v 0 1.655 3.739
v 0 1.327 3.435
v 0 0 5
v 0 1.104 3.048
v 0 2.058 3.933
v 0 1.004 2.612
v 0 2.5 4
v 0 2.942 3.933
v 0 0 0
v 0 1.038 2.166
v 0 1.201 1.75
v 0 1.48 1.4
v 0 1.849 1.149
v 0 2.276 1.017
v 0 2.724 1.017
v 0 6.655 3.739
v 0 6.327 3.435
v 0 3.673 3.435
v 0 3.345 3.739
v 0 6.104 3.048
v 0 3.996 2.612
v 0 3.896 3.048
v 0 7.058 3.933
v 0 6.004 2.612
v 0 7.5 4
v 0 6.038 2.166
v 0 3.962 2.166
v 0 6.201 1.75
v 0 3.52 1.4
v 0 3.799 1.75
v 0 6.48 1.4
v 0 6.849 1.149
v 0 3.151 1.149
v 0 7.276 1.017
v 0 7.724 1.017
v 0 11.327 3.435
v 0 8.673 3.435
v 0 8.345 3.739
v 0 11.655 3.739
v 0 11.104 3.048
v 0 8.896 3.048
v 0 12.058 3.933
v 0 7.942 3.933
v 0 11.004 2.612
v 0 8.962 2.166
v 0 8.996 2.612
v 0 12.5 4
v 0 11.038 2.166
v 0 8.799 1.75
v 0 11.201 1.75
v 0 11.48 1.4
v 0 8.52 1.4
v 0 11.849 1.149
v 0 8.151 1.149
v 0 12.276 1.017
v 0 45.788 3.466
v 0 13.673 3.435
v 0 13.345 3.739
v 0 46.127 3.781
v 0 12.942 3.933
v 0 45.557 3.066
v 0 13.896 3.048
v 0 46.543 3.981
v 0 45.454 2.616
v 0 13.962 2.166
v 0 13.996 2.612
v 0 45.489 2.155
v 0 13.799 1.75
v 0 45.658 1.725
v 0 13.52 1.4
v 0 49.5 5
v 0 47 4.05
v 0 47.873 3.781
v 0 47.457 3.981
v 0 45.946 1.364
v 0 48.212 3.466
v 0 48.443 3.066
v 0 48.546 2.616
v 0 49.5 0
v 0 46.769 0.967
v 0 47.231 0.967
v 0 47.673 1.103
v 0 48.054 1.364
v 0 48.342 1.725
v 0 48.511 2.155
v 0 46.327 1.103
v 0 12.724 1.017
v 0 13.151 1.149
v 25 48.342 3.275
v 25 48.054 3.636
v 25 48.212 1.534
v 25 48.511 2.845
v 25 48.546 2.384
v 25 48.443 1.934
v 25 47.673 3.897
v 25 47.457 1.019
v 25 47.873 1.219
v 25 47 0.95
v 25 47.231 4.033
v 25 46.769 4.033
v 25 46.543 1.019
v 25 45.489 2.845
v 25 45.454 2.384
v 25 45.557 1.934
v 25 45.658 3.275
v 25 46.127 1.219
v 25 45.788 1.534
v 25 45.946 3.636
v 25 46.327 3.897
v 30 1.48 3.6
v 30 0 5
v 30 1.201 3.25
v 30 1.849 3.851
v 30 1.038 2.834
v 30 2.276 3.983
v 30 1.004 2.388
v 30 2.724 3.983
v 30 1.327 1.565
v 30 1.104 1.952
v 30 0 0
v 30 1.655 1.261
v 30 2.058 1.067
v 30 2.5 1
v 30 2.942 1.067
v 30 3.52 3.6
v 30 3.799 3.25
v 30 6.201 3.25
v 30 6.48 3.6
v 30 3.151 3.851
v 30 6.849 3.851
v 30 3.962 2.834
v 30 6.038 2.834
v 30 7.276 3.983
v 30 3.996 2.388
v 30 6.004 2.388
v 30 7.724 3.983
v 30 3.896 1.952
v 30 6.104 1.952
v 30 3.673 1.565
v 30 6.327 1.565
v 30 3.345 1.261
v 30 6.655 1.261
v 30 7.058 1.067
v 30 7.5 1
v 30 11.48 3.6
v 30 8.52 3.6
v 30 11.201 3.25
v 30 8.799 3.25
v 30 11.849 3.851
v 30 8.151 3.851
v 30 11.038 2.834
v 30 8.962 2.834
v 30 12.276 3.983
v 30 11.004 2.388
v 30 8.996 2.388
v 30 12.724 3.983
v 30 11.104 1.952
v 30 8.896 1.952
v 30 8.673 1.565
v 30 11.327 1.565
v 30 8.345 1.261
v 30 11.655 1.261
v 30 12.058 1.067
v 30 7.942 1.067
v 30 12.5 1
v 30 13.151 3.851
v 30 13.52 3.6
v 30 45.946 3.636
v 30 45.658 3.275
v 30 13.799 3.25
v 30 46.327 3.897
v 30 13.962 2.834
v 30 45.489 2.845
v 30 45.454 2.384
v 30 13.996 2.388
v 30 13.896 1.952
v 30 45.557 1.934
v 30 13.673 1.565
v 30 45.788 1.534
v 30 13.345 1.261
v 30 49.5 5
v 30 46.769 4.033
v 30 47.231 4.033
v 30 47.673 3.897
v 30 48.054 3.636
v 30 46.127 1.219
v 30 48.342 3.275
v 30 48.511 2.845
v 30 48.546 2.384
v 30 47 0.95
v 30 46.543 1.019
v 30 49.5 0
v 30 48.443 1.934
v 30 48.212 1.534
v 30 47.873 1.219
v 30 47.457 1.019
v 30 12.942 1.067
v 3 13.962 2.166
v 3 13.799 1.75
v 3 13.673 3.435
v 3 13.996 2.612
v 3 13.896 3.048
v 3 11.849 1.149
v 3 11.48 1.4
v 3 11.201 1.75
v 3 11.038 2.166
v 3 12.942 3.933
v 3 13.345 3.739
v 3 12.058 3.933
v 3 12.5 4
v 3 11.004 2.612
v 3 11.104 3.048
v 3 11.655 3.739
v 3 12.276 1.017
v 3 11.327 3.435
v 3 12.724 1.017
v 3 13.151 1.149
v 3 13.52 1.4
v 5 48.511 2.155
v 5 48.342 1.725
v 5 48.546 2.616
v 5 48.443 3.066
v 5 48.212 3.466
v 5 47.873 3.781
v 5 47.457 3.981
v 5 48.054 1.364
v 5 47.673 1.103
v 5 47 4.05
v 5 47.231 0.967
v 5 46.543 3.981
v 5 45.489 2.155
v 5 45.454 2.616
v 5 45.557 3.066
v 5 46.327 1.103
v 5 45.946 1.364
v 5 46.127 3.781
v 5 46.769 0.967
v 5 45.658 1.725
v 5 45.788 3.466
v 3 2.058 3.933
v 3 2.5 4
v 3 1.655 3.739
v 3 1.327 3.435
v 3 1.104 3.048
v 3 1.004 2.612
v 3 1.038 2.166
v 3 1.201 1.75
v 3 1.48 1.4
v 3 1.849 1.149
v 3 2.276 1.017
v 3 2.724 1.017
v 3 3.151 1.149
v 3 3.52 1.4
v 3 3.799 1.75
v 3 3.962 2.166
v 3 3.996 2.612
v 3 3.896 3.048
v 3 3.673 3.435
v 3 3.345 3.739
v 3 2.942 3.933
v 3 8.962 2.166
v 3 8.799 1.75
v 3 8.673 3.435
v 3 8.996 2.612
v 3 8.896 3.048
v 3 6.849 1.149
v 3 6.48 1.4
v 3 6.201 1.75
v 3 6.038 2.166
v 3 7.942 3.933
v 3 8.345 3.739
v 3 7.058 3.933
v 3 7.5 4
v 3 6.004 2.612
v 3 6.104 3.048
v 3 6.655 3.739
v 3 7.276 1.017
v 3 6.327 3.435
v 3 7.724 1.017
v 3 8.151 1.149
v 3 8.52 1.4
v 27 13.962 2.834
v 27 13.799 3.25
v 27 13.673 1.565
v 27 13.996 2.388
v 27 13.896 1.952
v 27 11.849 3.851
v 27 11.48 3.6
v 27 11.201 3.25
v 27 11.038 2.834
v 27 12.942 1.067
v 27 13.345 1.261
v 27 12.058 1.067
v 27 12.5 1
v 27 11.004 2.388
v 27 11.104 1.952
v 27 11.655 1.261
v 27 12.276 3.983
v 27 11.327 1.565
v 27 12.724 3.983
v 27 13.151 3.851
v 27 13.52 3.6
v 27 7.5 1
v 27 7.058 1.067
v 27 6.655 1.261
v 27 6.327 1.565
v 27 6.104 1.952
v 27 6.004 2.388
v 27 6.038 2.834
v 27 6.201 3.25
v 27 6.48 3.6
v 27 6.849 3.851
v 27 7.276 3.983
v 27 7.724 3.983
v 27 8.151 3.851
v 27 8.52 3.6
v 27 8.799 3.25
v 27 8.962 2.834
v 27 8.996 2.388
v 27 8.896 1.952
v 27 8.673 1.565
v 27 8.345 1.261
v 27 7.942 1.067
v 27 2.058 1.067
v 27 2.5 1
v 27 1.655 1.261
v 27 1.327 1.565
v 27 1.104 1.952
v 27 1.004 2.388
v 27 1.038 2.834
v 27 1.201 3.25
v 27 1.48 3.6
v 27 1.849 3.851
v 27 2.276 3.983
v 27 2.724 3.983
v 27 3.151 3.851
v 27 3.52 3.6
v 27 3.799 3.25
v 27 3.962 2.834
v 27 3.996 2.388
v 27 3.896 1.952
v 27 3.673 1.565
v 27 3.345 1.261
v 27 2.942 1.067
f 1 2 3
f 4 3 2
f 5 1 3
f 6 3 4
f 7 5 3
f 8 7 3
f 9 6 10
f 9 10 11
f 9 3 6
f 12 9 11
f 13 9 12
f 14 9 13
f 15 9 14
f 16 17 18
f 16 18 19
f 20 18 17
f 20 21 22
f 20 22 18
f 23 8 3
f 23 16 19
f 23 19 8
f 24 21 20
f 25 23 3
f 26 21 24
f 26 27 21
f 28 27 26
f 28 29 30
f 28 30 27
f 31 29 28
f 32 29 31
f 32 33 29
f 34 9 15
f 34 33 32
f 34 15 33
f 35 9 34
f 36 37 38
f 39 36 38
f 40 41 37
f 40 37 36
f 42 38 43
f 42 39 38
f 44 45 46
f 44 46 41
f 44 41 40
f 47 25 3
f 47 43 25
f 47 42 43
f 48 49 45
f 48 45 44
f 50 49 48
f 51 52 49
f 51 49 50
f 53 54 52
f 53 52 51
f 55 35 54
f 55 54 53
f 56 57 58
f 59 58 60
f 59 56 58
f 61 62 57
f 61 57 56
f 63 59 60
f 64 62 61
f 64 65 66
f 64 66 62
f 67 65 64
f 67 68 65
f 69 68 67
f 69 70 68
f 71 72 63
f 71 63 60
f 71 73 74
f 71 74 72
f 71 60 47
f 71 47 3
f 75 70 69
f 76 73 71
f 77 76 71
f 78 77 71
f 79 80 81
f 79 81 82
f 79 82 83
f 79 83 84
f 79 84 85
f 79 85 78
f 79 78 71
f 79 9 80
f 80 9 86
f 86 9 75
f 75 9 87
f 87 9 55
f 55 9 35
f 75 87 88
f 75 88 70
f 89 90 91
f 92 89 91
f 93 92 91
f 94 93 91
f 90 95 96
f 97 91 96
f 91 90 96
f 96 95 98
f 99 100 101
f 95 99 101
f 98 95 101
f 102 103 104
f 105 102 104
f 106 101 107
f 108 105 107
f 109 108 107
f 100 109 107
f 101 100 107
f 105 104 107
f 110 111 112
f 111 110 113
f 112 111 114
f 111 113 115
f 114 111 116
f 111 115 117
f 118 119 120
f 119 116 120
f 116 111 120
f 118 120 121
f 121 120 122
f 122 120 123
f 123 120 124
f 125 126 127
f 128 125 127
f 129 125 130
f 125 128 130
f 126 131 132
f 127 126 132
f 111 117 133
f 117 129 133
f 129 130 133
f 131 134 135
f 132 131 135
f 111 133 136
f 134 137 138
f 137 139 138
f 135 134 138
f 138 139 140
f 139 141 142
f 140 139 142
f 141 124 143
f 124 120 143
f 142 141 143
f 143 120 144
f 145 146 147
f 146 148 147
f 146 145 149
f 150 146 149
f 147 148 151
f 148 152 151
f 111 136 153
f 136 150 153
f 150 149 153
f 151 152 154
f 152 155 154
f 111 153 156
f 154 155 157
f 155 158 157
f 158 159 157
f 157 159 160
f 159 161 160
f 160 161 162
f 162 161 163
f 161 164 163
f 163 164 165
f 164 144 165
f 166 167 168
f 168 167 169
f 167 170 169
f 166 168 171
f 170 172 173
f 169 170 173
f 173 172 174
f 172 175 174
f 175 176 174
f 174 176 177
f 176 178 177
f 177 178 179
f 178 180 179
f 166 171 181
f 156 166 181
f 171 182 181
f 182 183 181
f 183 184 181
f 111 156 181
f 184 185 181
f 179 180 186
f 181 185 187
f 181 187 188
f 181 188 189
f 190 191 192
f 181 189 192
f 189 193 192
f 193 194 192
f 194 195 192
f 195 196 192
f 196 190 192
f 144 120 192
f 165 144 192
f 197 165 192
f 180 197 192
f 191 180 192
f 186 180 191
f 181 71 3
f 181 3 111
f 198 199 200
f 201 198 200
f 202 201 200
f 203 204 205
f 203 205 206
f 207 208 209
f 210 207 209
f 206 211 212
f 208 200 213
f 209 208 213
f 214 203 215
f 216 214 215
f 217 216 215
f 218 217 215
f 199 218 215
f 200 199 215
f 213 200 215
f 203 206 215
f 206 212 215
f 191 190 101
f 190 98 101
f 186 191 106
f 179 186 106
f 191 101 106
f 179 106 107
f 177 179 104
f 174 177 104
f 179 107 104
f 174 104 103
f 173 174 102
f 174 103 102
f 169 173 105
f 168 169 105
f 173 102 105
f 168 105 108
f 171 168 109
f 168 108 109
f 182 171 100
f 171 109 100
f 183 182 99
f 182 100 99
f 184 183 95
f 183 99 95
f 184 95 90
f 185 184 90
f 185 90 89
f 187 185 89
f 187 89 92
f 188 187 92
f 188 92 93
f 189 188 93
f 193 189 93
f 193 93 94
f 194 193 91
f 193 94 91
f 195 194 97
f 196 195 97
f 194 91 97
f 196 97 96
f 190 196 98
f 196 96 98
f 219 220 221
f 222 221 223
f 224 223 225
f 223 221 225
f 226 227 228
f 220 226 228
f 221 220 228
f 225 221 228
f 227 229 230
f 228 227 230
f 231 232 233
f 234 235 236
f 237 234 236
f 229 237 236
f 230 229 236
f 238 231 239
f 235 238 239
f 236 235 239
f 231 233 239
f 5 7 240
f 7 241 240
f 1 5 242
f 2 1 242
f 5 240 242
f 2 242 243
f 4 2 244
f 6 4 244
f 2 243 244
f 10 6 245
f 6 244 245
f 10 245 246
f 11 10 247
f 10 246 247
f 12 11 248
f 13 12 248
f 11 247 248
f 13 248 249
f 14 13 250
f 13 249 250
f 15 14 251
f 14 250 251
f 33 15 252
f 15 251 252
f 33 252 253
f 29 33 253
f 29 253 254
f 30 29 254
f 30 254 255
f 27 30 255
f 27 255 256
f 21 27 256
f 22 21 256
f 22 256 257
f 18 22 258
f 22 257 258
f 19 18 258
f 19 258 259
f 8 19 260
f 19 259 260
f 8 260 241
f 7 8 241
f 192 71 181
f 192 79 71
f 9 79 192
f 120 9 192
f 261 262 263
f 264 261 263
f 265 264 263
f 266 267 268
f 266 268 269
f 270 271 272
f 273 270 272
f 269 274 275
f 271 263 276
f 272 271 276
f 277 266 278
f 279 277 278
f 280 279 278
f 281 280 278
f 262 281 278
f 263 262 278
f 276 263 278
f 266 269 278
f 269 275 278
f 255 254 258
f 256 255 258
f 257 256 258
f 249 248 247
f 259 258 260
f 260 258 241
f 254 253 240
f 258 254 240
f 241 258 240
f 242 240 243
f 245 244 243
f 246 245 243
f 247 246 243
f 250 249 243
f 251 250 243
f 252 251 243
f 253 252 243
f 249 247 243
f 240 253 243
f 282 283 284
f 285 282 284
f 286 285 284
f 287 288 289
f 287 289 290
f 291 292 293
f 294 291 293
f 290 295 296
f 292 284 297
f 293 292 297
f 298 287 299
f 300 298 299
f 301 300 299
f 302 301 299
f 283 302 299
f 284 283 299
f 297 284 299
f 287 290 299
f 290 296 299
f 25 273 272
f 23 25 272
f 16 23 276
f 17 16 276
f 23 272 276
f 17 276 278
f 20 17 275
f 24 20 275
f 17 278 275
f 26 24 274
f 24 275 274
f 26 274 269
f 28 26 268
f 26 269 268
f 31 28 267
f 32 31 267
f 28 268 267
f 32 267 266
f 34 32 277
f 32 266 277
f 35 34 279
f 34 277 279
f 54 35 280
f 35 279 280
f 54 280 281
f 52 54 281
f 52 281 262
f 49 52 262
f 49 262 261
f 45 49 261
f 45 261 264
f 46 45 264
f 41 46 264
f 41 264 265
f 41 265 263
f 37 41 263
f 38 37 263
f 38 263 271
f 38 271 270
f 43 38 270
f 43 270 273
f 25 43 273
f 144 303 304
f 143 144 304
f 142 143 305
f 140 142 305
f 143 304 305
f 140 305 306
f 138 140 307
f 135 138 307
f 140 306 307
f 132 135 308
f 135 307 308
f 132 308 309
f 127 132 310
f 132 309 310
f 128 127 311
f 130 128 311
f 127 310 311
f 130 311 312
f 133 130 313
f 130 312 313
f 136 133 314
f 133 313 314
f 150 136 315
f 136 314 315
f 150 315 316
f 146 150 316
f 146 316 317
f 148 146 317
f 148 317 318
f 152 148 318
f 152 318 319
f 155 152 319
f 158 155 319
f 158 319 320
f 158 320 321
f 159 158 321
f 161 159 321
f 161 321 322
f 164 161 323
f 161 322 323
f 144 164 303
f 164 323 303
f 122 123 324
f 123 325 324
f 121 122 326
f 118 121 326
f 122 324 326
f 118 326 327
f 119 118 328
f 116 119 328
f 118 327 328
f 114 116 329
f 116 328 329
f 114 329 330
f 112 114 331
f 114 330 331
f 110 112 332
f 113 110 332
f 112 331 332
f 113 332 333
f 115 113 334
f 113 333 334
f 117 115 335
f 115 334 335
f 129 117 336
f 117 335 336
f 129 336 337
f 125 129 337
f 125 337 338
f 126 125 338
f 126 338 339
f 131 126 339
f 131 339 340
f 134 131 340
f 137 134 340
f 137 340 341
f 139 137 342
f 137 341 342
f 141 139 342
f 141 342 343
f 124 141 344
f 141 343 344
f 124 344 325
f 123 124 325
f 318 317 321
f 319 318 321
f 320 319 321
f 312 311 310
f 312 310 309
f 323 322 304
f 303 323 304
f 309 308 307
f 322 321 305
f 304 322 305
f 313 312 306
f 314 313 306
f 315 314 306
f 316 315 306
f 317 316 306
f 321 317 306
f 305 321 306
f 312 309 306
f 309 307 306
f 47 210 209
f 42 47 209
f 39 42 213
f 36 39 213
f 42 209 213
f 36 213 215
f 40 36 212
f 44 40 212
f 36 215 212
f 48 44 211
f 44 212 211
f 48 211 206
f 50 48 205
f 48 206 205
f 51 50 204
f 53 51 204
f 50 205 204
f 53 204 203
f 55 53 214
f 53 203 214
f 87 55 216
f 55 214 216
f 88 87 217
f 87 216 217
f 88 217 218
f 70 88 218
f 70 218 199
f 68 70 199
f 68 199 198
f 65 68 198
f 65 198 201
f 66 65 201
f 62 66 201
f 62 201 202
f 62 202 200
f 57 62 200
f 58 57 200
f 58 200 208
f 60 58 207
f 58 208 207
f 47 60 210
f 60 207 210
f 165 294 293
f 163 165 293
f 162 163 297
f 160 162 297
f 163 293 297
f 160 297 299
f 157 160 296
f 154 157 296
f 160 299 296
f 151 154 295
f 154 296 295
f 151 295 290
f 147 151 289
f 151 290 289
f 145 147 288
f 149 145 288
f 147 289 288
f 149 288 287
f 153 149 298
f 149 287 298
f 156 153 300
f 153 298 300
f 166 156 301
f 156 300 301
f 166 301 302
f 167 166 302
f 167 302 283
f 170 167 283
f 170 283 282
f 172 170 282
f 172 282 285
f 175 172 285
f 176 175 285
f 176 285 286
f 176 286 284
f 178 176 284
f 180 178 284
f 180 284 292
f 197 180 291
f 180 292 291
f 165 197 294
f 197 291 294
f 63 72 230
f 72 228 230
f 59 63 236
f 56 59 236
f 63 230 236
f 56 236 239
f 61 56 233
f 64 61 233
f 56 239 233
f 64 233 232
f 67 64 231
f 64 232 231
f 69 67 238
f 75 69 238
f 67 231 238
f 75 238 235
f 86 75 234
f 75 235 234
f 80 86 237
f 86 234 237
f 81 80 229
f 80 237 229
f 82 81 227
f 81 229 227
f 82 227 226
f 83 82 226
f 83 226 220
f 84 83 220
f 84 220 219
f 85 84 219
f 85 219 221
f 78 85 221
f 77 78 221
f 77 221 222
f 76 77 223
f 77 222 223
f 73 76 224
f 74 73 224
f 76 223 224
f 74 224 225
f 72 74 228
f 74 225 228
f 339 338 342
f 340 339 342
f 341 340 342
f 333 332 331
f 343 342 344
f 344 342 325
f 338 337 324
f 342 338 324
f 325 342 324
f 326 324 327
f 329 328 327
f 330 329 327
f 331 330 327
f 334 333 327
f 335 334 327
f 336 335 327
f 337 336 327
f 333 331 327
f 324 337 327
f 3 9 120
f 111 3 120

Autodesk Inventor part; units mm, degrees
ref_plane "YZ Plane" through (0, 0, 0) normal (1, 0, 0) x (0, 1, 0)
ref_plane "XZ Plane" through (0, 0, 0) normal (0, 1, 0) x (-1, 0, 0)
ref_plane "XY Plane" through (0, 0, 0) normal (0, 0, 1) x (1, 0, 0)
sketch "スケッチ1" plane through (0, 0, 0) normal (0, 0, 1) x (1, 0, 0)
  line L0 (0, 49.5) -> (30, 49.5)
  line L1 (0, 0) -> (30, 0)
  line L2 (0, 0) -> (0, 49.5)
  line L3 (30, 0) -> (30, 49.5)
  dimension "d2" = 30
  dimension "d38" = 49.5
extrude "押し出し1" add sketch "スケッチ1" along normal blind 5
sketch "スケッチ4" plane through (30, 0, 0) normal (1, 0, 0) x (0, 0, -1)
  line L0 (0, 49.5) -> (-5, 49.5) projected
  line L1 (-2.5, 49.5) -> (-2.5, 0) construction
  line L2 (0, 0) -> (-5, 0) projected
  point P0 (0, 0)
  point P1 (-2.5, 47)
  point P2 (-2.5, 2.5)
  point P3 (-2.5, 7.5)
  point P4 (-2.5, 12.5)
  dimension "d22" = 2.5
  dimension "d40" = 2.5
  dimension "d41" = 5
  dimension "d42" = 5
hole "穴1" at (30, 47, 2.5) direction (-1, 0, 0) diameter 3.1 depth 5
sketch "スケッチ5" plane through (0, 0, 0) normal (-1, 0, 0) x (0, 0, 1)
  circle A0 centre (2.5, 47) radius 1.55 projected
  line L0 (0, 0) -> (5, 0) projected
  line L1 (2.5, 0) -> (2.5, 49.5) construction
  line L2 (0, 49.5) -> (5, 49.5) projected
  point P0 (2.5, 2.5)
  point P1 (2.5, 7.5)
  point P2 (2.5, 12.5)
  dimension "d50" = 2.5
  dimension "d51" = 5
  dimension "d52" = 5
hole "穴2" at (0, 47, 2.5) direction (1, 0, 0) diameter 3.1 depth 5
hole "穴5" at (30, 2.5, 2.5) at (30, 12.5, 2.5) at (30, 7.5, 2.5) direction (-1, 0, 0) diameter 3 depth 3
hole "穴6" at (0, 2.5, 2.5) at (0, 7.5, 2.5) at (0, 12.5, 2.5) direction (1, 0, 0) diameter 3 depth 3
equation "\"d41\" = d42"
equation "\"d50\" = d40"
equation "\"d51\" = d41"
equation "\"d52\" = d42"
properties part number "Cockpit_vertical_frame_07" material "アセタール樹脂、黒"
